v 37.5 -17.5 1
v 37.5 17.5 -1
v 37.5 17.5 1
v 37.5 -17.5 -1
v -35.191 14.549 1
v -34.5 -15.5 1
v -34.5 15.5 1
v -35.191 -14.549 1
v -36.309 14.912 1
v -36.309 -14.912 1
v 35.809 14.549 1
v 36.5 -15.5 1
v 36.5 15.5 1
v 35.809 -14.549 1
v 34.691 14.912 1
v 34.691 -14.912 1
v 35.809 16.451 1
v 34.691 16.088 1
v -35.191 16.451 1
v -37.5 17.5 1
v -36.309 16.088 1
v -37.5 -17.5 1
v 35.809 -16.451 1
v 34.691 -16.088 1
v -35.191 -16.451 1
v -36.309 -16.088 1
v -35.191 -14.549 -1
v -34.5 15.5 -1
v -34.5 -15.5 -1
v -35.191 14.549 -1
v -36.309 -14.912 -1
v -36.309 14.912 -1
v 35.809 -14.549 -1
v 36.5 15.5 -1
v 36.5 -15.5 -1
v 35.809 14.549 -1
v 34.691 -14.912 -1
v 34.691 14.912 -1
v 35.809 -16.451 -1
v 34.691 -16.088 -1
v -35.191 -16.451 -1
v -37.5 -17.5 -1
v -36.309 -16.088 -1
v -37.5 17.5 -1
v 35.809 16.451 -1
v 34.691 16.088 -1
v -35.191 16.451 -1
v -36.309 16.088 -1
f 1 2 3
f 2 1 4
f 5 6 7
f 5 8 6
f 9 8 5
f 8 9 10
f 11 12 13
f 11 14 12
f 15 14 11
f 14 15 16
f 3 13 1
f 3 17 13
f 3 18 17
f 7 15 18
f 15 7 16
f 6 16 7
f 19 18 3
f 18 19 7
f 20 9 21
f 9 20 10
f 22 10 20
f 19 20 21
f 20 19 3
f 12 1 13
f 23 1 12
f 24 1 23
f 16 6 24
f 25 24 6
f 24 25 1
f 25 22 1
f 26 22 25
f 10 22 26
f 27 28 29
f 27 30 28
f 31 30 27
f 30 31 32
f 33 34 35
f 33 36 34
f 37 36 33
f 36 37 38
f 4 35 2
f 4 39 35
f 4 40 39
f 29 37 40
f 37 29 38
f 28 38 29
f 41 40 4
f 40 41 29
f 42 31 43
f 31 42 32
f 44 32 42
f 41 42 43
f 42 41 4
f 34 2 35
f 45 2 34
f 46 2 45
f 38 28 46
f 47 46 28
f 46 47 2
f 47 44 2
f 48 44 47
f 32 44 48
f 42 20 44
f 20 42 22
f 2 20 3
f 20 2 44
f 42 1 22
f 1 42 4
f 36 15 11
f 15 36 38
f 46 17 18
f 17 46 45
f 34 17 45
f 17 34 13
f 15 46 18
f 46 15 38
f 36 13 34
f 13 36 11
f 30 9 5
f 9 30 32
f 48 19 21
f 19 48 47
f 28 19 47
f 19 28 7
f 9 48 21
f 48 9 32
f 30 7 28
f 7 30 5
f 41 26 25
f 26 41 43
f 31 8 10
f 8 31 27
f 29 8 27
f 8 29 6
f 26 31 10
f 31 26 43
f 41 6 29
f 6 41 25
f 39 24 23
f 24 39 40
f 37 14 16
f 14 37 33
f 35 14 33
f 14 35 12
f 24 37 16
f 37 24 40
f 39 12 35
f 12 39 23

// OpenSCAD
//device dimensions
//63.64 * 28.0 * 9mm
//without USB port or pins
//battery 26x20x4
//display 23 x 13
//total thickness needed = 18mm
//
//top half is just a thin box with a hole for the display
// M2 screws

overallX = 75;
overallY = 35;
bothalfZ = 2;
hole_r = 1;
hole_offset = 2;

difference(){
    cube([overallX,overallY,bothalfZ],center=true);
translate([overallX/2-hole_offset,overallY/2-hole_offset,-2])
    cylinder(10,hole_r,hole_r);
translate([-overallX/2+hole_offset,overallY/2-hole_offset,-2])
    cylinder(10,hole_r,hole_r);
translate([-overallX/2+hole_offset,-overallY/2+hole_offset,-2])
    cylinder(10,hole_r,hole_r);
translate([overallX/2-hole_offset,-overallY/2+hole_offset,-2])
    cylinder(10,hole_r,hole_r);
    }
